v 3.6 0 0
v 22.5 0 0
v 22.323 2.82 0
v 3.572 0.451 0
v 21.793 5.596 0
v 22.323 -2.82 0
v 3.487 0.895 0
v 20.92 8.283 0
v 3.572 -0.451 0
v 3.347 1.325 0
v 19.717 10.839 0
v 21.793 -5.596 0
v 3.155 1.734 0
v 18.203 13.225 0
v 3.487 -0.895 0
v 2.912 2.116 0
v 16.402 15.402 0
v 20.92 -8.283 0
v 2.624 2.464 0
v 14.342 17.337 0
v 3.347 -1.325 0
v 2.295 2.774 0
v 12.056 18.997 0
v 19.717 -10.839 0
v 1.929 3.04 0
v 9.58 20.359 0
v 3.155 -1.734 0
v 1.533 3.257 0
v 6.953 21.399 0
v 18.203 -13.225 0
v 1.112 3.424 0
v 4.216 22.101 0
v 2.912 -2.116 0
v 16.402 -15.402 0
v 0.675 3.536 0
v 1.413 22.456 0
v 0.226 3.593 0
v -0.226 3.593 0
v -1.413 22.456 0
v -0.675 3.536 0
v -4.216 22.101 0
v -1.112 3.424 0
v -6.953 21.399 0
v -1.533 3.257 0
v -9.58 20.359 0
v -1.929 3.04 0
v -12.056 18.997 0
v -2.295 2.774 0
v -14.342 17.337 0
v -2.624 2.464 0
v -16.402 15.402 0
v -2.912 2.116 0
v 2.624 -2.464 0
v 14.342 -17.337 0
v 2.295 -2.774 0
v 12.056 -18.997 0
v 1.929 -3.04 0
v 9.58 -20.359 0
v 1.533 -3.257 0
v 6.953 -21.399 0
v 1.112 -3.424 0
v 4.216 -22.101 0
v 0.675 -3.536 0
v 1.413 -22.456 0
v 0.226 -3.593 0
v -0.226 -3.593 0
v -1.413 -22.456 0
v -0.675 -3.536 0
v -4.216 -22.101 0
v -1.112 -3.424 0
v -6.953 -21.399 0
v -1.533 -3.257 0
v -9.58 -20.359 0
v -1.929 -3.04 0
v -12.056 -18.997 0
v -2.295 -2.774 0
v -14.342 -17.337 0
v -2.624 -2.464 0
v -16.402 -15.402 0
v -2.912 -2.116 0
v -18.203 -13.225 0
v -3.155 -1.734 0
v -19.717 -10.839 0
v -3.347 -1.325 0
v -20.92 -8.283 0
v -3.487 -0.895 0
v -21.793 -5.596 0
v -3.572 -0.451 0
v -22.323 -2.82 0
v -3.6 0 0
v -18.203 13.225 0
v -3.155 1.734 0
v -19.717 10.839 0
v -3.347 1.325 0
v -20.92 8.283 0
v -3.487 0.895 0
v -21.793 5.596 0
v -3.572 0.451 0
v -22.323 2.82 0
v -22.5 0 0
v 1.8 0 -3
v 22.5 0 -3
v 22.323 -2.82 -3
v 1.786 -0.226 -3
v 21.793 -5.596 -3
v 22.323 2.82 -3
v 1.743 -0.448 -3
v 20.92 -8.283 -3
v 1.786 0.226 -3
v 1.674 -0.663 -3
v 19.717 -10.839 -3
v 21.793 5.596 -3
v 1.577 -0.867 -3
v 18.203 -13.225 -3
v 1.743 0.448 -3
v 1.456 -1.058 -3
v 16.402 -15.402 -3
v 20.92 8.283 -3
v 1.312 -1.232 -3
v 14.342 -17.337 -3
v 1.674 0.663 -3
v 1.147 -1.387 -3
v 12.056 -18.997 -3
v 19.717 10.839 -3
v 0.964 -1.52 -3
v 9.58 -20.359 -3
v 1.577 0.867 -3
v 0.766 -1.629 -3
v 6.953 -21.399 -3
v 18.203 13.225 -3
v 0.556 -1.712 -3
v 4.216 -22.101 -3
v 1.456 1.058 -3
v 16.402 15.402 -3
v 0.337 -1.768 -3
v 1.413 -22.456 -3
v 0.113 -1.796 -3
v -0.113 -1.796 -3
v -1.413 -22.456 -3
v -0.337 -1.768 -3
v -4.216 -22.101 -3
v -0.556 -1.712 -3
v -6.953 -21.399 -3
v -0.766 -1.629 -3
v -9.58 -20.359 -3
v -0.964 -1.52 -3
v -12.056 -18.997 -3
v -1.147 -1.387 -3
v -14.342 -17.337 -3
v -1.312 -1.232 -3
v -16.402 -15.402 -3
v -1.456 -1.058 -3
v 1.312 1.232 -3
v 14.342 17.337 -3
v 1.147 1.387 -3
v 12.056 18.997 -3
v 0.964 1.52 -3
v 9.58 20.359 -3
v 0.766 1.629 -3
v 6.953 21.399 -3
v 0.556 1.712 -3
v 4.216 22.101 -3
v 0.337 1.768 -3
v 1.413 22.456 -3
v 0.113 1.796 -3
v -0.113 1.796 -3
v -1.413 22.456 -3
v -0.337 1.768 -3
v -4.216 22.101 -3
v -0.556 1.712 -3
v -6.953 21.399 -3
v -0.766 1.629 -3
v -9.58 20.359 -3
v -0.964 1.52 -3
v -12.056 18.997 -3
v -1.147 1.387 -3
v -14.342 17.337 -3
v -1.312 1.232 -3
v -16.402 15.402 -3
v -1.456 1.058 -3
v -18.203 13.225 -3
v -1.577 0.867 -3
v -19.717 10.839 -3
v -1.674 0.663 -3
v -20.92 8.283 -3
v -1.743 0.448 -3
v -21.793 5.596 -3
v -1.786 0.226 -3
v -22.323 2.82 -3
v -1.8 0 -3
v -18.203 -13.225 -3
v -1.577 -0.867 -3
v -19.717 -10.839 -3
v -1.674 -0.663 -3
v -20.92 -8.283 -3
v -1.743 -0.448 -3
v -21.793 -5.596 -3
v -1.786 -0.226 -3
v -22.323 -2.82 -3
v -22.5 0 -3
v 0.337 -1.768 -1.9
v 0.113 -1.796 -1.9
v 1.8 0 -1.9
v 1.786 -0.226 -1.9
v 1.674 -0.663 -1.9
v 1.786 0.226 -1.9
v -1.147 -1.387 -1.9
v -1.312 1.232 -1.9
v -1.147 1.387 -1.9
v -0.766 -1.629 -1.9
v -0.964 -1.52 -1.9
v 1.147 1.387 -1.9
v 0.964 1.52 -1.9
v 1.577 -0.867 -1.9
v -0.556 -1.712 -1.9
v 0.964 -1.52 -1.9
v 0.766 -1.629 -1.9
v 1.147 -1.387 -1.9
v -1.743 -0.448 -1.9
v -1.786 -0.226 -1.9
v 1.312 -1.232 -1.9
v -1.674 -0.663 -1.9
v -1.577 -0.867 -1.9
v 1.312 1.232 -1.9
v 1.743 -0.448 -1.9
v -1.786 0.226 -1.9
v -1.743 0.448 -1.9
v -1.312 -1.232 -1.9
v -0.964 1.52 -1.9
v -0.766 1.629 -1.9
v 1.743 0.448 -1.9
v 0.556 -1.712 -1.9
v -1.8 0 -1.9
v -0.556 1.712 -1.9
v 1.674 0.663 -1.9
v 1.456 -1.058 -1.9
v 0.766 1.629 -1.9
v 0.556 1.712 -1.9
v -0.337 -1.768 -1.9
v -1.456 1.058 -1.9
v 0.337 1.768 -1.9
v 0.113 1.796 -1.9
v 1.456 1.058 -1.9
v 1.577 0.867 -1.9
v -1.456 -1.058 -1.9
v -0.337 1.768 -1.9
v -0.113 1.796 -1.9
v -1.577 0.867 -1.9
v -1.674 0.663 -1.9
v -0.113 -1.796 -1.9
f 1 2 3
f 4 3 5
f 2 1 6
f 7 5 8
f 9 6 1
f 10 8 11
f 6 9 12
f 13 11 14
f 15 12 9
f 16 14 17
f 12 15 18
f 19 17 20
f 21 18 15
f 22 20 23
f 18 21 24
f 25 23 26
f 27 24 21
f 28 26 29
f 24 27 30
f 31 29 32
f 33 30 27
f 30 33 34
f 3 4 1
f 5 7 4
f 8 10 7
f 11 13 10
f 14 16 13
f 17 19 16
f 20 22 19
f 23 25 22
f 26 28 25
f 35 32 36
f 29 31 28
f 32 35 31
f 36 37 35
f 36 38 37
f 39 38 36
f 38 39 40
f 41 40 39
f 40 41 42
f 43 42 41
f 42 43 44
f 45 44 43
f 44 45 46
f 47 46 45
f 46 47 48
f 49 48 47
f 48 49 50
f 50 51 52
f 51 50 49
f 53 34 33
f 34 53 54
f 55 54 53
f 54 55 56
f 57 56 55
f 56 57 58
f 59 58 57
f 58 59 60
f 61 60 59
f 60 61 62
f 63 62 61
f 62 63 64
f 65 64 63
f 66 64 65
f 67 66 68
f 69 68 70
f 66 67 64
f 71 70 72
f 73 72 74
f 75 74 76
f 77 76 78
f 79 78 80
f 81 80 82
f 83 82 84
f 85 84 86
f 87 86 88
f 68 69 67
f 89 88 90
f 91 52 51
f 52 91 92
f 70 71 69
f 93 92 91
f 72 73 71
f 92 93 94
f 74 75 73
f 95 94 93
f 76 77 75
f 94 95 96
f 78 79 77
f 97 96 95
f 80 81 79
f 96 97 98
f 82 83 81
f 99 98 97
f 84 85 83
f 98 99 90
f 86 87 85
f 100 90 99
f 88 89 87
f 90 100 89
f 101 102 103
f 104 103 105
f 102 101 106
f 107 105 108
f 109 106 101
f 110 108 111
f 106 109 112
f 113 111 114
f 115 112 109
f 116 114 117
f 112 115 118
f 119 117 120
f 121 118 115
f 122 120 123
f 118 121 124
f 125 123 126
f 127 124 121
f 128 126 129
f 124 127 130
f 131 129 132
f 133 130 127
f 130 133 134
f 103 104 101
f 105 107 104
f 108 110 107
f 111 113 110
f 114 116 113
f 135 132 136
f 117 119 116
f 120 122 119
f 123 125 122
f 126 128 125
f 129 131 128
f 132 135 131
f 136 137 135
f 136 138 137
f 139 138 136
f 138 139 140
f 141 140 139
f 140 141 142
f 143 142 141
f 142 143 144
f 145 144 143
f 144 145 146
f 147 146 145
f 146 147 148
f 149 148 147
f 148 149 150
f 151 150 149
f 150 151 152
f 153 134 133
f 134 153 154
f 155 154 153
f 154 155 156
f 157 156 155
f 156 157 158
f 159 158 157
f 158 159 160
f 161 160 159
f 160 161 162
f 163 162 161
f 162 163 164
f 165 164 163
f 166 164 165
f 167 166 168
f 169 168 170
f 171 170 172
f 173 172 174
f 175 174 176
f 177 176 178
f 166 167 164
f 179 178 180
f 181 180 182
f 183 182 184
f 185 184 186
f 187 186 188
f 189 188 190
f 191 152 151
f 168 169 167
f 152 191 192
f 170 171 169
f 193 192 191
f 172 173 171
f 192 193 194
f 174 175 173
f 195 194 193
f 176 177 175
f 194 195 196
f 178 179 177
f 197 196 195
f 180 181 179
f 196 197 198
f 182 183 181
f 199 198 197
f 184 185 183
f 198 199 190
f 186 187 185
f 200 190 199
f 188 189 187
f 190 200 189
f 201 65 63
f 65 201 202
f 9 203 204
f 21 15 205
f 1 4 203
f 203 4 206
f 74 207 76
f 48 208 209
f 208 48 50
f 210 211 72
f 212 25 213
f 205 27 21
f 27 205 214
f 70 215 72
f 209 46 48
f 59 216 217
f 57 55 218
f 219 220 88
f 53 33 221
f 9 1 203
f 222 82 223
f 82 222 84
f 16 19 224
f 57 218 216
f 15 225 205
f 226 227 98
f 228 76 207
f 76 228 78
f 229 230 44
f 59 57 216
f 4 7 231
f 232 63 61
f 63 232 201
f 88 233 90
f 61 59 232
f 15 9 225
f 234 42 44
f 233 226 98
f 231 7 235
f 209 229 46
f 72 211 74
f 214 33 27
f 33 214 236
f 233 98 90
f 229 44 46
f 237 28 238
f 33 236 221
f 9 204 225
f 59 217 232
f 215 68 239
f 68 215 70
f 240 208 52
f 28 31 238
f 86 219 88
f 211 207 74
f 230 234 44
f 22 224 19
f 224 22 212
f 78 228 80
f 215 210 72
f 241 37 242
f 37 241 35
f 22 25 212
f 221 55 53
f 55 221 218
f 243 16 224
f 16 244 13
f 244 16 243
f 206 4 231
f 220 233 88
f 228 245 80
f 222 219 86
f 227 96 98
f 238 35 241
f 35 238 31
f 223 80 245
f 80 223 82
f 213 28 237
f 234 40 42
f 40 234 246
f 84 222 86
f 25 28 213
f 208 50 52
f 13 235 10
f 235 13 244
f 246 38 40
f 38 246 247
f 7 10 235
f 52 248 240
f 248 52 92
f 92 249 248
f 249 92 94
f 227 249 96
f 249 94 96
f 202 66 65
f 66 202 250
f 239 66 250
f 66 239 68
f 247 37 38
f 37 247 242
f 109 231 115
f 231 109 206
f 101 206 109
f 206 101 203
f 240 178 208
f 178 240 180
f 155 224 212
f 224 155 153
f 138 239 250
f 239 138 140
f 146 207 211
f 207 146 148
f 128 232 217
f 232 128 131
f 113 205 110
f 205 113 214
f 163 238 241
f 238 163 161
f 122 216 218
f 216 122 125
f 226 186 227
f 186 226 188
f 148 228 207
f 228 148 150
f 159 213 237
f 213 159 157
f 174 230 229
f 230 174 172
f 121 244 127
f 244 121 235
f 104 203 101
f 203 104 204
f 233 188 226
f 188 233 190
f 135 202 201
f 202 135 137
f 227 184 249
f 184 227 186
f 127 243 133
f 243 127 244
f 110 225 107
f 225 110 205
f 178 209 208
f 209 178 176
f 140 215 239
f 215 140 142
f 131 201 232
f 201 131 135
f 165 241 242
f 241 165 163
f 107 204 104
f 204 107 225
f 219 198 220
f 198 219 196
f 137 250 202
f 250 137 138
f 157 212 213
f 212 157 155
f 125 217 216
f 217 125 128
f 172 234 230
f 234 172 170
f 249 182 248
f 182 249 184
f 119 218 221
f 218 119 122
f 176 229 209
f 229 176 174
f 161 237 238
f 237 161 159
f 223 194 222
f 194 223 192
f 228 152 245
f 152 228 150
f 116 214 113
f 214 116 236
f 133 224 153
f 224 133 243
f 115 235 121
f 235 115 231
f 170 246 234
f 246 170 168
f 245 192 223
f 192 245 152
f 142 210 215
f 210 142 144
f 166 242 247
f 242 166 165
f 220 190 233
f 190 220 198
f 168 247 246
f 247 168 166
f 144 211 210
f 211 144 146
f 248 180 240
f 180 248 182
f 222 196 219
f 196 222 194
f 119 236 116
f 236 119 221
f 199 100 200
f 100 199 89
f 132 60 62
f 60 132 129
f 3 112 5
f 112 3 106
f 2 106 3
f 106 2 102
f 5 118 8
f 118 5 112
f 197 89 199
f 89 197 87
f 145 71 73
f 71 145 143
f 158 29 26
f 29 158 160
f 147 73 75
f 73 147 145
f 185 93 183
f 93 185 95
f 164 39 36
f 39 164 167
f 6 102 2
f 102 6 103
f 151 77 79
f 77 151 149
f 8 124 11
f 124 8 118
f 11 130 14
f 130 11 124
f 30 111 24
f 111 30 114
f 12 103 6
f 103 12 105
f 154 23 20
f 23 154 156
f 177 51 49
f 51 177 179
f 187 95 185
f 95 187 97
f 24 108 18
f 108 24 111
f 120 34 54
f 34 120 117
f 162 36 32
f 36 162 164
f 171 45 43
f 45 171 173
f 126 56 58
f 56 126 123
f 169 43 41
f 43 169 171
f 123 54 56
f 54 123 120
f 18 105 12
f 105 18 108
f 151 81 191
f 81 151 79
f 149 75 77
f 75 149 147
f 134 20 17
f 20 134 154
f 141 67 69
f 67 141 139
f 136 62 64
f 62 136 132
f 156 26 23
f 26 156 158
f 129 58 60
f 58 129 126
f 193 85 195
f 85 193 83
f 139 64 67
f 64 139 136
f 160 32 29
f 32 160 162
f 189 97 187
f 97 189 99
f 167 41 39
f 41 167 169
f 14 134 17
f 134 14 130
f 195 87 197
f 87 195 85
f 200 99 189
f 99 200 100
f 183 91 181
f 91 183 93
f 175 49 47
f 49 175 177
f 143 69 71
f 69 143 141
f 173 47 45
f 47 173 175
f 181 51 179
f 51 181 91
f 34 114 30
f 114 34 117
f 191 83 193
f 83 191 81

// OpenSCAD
$fn = 50;


difference() {
	union() {
		translate(v = [0, 0, -3.0000000000]) {
			cylinder(h = 3, r = 22.5000000000);
		}
	}
	union() {
		translate(v = [0, 0, 0]) {
			rotate(a = [0, 0, 0]) {
				difference() {
					union() {
						translate(v = [0, 0, -3.0000000000]) {
							cylinder(h = 3, r = 1.5000000000);
						}
						translate(v = [0, 0, -1.9000000000]) {
							cylinder(h = 1.9000000000, r1 = 1.8000000000, r2 = 3.6000000000);
						}
						translate(v = [0, 0, -3.0000000000]) {
							cylinder(h = 3, r = 1.8000000000);
						}
						translate(v = [0, 0, -3.0000000000]) {
							cylinder(h = 3, r = 1.5000000000);
						}
					}
					union();
				}
			}
		}
	}
}
